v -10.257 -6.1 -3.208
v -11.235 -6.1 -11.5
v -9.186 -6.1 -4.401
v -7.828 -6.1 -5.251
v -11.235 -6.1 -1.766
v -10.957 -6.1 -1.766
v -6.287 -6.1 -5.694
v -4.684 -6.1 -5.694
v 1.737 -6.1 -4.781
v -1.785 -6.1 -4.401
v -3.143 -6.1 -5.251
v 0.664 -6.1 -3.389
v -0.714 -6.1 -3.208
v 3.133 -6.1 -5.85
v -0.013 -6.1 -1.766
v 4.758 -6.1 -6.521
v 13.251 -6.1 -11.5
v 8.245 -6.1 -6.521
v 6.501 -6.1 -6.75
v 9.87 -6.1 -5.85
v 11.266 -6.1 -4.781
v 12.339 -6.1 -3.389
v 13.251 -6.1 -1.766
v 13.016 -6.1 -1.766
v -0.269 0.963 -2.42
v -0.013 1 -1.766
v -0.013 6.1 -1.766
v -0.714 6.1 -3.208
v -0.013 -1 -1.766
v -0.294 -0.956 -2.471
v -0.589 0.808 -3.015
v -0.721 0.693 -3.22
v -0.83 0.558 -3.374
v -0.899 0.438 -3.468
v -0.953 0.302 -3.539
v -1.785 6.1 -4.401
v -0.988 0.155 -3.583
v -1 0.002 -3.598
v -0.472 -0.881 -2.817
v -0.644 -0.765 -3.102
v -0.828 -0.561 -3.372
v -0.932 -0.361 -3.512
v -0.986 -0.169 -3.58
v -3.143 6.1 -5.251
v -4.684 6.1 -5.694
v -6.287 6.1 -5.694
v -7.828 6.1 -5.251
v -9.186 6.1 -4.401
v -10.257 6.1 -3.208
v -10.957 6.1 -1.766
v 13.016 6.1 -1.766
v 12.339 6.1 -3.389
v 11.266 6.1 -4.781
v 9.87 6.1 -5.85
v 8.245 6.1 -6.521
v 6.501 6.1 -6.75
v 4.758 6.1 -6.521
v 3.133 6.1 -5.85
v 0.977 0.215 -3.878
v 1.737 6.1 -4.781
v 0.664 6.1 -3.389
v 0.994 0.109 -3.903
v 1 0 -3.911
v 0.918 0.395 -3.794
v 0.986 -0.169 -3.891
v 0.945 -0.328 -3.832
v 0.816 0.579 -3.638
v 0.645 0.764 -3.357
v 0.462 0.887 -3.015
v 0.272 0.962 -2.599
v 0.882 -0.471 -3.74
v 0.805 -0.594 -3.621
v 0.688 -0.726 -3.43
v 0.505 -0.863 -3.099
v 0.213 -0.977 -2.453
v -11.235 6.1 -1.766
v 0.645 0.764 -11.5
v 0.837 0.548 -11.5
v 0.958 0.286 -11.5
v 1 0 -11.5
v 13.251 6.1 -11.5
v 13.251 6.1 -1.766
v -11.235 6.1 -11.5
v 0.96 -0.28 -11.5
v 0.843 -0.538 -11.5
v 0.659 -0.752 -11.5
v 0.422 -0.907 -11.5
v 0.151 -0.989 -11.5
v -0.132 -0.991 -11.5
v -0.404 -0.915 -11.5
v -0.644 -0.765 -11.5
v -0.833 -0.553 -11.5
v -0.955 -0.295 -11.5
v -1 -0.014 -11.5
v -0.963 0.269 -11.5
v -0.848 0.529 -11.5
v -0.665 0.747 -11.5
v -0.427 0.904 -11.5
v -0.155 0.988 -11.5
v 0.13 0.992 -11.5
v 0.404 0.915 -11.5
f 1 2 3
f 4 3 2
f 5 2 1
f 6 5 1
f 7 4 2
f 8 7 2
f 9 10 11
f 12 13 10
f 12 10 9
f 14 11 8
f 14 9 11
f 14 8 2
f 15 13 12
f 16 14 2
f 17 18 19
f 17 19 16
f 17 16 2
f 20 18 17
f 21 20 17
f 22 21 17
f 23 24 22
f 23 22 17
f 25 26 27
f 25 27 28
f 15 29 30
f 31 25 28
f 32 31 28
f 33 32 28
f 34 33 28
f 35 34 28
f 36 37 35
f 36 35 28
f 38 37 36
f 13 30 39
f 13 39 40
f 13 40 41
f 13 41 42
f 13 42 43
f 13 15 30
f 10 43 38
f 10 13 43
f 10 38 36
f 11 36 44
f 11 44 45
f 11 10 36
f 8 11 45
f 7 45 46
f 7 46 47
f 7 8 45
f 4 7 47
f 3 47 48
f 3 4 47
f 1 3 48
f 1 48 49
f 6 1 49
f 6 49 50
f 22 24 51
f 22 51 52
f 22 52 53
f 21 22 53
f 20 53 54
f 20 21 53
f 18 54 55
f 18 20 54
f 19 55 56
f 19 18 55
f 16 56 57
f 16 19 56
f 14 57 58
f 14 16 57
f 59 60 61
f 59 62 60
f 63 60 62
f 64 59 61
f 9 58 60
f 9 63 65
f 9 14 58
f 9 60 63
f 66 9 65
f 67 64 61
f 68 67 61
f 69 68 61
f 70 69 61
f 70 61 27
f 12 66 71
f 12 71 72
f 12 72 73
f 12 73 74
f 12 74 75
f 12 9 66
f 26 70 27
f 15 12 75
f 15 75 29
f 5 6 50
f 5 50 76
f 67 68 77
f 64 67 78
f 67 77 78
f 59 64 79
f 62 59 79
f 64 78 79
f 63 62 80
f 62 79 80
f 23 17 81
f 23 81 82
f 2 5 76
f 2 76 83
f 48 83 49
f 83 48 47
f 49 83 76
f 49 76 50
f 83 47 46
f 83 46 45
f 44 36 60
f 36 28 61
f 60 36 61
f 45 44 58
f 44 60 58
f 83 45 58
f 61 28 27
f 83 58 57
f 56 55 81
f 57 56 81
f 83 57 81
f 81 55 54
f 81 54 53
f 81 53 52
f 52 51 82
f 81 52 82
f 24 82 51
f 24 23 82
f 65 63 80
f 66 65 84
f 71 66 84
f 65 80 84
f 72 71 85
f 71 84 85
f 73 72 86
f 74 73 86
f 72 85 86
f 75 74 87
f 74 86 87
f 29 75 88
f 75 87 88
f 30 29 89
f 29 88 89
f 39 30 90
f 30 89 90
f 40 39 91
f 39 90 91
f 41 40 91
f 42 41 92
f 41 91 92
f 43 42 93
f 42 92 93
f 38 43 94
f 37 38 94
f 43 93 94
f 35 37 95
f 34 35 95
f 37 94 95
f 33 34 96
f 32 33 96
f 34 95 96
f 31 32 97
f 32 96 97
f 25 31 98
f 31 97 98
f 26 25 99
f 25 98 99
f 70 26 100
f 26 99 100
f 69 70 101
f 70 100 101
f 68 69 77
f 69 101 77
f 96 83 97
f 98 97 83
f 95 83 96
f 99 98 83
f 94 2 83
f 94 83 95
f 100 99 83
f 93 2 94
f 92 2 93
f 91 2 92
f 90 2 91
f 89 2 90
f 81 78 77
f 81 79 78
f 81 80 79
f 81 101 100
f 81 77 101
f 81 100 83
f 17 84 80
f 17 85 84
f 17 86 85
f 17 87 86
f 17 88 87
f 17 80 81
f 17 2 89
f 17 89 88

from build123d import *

# Parameters (mm, degrees)
F1_DEPTH = 6.1
F3_DEPTH = 25


with BuildPart() as f1:
    # F0 (on Front) → F1 (new body, symmetric)
    with BuildSketch(Plane.XZ):
        with BuildLine():
            ThreePointArc((-0.013371, -1.766178), (-5.485401, -5.75), (-10.957431, -1.766178))
            Line((-10.957431, -1.766178), (-11.235401, -1.766178))
            Line((-11.235401, -1.766178), (-11.235401, -11.5))
            Line((-11.235401, -11.5), (13.251467, -11.5))
            Line((13.251467, -11.5), (13.251467, -1.766178))
            Line((13.251467, -1.766178), (13.016305, -1.766178))
            ThreePointArc((13.016305, -1.766178), (6.501467, -6.75), (-0.013371, -1.766178))
        make_face()
    extrude(amount=F1_DEPTH, both=True)

    # F2 (on face) → F3 (cut)
    with BuildSketch(Plane(origin=(0, 0, -11.5), x_dir=(1, 0, 0), z_dir=(0, 0, -1))):
        with BuildLine():
            ThreePointArc((0.64533, -0.763904), (0.907009, -0.421112), (1, 0))
            ThreePointArc((1, 0), (0.421933, 0.906627), (-0.643945, 0.765072))
            Line((-0.643945, 0.765072), (0.64533, -0.763904))
        make_face()
        with BuildLine():
            Line((0.64533, -0.763904), (-0.643945, 0.765072))
            ThreePointArc((-0.643945, 0.765072), (-0.764488, -0.644638), (0.64533, -0.763904))
        make_face()
    extrude(amount=-F3_DEPTH, mode=Mode.SUBTRACT)


solid = f1.part
